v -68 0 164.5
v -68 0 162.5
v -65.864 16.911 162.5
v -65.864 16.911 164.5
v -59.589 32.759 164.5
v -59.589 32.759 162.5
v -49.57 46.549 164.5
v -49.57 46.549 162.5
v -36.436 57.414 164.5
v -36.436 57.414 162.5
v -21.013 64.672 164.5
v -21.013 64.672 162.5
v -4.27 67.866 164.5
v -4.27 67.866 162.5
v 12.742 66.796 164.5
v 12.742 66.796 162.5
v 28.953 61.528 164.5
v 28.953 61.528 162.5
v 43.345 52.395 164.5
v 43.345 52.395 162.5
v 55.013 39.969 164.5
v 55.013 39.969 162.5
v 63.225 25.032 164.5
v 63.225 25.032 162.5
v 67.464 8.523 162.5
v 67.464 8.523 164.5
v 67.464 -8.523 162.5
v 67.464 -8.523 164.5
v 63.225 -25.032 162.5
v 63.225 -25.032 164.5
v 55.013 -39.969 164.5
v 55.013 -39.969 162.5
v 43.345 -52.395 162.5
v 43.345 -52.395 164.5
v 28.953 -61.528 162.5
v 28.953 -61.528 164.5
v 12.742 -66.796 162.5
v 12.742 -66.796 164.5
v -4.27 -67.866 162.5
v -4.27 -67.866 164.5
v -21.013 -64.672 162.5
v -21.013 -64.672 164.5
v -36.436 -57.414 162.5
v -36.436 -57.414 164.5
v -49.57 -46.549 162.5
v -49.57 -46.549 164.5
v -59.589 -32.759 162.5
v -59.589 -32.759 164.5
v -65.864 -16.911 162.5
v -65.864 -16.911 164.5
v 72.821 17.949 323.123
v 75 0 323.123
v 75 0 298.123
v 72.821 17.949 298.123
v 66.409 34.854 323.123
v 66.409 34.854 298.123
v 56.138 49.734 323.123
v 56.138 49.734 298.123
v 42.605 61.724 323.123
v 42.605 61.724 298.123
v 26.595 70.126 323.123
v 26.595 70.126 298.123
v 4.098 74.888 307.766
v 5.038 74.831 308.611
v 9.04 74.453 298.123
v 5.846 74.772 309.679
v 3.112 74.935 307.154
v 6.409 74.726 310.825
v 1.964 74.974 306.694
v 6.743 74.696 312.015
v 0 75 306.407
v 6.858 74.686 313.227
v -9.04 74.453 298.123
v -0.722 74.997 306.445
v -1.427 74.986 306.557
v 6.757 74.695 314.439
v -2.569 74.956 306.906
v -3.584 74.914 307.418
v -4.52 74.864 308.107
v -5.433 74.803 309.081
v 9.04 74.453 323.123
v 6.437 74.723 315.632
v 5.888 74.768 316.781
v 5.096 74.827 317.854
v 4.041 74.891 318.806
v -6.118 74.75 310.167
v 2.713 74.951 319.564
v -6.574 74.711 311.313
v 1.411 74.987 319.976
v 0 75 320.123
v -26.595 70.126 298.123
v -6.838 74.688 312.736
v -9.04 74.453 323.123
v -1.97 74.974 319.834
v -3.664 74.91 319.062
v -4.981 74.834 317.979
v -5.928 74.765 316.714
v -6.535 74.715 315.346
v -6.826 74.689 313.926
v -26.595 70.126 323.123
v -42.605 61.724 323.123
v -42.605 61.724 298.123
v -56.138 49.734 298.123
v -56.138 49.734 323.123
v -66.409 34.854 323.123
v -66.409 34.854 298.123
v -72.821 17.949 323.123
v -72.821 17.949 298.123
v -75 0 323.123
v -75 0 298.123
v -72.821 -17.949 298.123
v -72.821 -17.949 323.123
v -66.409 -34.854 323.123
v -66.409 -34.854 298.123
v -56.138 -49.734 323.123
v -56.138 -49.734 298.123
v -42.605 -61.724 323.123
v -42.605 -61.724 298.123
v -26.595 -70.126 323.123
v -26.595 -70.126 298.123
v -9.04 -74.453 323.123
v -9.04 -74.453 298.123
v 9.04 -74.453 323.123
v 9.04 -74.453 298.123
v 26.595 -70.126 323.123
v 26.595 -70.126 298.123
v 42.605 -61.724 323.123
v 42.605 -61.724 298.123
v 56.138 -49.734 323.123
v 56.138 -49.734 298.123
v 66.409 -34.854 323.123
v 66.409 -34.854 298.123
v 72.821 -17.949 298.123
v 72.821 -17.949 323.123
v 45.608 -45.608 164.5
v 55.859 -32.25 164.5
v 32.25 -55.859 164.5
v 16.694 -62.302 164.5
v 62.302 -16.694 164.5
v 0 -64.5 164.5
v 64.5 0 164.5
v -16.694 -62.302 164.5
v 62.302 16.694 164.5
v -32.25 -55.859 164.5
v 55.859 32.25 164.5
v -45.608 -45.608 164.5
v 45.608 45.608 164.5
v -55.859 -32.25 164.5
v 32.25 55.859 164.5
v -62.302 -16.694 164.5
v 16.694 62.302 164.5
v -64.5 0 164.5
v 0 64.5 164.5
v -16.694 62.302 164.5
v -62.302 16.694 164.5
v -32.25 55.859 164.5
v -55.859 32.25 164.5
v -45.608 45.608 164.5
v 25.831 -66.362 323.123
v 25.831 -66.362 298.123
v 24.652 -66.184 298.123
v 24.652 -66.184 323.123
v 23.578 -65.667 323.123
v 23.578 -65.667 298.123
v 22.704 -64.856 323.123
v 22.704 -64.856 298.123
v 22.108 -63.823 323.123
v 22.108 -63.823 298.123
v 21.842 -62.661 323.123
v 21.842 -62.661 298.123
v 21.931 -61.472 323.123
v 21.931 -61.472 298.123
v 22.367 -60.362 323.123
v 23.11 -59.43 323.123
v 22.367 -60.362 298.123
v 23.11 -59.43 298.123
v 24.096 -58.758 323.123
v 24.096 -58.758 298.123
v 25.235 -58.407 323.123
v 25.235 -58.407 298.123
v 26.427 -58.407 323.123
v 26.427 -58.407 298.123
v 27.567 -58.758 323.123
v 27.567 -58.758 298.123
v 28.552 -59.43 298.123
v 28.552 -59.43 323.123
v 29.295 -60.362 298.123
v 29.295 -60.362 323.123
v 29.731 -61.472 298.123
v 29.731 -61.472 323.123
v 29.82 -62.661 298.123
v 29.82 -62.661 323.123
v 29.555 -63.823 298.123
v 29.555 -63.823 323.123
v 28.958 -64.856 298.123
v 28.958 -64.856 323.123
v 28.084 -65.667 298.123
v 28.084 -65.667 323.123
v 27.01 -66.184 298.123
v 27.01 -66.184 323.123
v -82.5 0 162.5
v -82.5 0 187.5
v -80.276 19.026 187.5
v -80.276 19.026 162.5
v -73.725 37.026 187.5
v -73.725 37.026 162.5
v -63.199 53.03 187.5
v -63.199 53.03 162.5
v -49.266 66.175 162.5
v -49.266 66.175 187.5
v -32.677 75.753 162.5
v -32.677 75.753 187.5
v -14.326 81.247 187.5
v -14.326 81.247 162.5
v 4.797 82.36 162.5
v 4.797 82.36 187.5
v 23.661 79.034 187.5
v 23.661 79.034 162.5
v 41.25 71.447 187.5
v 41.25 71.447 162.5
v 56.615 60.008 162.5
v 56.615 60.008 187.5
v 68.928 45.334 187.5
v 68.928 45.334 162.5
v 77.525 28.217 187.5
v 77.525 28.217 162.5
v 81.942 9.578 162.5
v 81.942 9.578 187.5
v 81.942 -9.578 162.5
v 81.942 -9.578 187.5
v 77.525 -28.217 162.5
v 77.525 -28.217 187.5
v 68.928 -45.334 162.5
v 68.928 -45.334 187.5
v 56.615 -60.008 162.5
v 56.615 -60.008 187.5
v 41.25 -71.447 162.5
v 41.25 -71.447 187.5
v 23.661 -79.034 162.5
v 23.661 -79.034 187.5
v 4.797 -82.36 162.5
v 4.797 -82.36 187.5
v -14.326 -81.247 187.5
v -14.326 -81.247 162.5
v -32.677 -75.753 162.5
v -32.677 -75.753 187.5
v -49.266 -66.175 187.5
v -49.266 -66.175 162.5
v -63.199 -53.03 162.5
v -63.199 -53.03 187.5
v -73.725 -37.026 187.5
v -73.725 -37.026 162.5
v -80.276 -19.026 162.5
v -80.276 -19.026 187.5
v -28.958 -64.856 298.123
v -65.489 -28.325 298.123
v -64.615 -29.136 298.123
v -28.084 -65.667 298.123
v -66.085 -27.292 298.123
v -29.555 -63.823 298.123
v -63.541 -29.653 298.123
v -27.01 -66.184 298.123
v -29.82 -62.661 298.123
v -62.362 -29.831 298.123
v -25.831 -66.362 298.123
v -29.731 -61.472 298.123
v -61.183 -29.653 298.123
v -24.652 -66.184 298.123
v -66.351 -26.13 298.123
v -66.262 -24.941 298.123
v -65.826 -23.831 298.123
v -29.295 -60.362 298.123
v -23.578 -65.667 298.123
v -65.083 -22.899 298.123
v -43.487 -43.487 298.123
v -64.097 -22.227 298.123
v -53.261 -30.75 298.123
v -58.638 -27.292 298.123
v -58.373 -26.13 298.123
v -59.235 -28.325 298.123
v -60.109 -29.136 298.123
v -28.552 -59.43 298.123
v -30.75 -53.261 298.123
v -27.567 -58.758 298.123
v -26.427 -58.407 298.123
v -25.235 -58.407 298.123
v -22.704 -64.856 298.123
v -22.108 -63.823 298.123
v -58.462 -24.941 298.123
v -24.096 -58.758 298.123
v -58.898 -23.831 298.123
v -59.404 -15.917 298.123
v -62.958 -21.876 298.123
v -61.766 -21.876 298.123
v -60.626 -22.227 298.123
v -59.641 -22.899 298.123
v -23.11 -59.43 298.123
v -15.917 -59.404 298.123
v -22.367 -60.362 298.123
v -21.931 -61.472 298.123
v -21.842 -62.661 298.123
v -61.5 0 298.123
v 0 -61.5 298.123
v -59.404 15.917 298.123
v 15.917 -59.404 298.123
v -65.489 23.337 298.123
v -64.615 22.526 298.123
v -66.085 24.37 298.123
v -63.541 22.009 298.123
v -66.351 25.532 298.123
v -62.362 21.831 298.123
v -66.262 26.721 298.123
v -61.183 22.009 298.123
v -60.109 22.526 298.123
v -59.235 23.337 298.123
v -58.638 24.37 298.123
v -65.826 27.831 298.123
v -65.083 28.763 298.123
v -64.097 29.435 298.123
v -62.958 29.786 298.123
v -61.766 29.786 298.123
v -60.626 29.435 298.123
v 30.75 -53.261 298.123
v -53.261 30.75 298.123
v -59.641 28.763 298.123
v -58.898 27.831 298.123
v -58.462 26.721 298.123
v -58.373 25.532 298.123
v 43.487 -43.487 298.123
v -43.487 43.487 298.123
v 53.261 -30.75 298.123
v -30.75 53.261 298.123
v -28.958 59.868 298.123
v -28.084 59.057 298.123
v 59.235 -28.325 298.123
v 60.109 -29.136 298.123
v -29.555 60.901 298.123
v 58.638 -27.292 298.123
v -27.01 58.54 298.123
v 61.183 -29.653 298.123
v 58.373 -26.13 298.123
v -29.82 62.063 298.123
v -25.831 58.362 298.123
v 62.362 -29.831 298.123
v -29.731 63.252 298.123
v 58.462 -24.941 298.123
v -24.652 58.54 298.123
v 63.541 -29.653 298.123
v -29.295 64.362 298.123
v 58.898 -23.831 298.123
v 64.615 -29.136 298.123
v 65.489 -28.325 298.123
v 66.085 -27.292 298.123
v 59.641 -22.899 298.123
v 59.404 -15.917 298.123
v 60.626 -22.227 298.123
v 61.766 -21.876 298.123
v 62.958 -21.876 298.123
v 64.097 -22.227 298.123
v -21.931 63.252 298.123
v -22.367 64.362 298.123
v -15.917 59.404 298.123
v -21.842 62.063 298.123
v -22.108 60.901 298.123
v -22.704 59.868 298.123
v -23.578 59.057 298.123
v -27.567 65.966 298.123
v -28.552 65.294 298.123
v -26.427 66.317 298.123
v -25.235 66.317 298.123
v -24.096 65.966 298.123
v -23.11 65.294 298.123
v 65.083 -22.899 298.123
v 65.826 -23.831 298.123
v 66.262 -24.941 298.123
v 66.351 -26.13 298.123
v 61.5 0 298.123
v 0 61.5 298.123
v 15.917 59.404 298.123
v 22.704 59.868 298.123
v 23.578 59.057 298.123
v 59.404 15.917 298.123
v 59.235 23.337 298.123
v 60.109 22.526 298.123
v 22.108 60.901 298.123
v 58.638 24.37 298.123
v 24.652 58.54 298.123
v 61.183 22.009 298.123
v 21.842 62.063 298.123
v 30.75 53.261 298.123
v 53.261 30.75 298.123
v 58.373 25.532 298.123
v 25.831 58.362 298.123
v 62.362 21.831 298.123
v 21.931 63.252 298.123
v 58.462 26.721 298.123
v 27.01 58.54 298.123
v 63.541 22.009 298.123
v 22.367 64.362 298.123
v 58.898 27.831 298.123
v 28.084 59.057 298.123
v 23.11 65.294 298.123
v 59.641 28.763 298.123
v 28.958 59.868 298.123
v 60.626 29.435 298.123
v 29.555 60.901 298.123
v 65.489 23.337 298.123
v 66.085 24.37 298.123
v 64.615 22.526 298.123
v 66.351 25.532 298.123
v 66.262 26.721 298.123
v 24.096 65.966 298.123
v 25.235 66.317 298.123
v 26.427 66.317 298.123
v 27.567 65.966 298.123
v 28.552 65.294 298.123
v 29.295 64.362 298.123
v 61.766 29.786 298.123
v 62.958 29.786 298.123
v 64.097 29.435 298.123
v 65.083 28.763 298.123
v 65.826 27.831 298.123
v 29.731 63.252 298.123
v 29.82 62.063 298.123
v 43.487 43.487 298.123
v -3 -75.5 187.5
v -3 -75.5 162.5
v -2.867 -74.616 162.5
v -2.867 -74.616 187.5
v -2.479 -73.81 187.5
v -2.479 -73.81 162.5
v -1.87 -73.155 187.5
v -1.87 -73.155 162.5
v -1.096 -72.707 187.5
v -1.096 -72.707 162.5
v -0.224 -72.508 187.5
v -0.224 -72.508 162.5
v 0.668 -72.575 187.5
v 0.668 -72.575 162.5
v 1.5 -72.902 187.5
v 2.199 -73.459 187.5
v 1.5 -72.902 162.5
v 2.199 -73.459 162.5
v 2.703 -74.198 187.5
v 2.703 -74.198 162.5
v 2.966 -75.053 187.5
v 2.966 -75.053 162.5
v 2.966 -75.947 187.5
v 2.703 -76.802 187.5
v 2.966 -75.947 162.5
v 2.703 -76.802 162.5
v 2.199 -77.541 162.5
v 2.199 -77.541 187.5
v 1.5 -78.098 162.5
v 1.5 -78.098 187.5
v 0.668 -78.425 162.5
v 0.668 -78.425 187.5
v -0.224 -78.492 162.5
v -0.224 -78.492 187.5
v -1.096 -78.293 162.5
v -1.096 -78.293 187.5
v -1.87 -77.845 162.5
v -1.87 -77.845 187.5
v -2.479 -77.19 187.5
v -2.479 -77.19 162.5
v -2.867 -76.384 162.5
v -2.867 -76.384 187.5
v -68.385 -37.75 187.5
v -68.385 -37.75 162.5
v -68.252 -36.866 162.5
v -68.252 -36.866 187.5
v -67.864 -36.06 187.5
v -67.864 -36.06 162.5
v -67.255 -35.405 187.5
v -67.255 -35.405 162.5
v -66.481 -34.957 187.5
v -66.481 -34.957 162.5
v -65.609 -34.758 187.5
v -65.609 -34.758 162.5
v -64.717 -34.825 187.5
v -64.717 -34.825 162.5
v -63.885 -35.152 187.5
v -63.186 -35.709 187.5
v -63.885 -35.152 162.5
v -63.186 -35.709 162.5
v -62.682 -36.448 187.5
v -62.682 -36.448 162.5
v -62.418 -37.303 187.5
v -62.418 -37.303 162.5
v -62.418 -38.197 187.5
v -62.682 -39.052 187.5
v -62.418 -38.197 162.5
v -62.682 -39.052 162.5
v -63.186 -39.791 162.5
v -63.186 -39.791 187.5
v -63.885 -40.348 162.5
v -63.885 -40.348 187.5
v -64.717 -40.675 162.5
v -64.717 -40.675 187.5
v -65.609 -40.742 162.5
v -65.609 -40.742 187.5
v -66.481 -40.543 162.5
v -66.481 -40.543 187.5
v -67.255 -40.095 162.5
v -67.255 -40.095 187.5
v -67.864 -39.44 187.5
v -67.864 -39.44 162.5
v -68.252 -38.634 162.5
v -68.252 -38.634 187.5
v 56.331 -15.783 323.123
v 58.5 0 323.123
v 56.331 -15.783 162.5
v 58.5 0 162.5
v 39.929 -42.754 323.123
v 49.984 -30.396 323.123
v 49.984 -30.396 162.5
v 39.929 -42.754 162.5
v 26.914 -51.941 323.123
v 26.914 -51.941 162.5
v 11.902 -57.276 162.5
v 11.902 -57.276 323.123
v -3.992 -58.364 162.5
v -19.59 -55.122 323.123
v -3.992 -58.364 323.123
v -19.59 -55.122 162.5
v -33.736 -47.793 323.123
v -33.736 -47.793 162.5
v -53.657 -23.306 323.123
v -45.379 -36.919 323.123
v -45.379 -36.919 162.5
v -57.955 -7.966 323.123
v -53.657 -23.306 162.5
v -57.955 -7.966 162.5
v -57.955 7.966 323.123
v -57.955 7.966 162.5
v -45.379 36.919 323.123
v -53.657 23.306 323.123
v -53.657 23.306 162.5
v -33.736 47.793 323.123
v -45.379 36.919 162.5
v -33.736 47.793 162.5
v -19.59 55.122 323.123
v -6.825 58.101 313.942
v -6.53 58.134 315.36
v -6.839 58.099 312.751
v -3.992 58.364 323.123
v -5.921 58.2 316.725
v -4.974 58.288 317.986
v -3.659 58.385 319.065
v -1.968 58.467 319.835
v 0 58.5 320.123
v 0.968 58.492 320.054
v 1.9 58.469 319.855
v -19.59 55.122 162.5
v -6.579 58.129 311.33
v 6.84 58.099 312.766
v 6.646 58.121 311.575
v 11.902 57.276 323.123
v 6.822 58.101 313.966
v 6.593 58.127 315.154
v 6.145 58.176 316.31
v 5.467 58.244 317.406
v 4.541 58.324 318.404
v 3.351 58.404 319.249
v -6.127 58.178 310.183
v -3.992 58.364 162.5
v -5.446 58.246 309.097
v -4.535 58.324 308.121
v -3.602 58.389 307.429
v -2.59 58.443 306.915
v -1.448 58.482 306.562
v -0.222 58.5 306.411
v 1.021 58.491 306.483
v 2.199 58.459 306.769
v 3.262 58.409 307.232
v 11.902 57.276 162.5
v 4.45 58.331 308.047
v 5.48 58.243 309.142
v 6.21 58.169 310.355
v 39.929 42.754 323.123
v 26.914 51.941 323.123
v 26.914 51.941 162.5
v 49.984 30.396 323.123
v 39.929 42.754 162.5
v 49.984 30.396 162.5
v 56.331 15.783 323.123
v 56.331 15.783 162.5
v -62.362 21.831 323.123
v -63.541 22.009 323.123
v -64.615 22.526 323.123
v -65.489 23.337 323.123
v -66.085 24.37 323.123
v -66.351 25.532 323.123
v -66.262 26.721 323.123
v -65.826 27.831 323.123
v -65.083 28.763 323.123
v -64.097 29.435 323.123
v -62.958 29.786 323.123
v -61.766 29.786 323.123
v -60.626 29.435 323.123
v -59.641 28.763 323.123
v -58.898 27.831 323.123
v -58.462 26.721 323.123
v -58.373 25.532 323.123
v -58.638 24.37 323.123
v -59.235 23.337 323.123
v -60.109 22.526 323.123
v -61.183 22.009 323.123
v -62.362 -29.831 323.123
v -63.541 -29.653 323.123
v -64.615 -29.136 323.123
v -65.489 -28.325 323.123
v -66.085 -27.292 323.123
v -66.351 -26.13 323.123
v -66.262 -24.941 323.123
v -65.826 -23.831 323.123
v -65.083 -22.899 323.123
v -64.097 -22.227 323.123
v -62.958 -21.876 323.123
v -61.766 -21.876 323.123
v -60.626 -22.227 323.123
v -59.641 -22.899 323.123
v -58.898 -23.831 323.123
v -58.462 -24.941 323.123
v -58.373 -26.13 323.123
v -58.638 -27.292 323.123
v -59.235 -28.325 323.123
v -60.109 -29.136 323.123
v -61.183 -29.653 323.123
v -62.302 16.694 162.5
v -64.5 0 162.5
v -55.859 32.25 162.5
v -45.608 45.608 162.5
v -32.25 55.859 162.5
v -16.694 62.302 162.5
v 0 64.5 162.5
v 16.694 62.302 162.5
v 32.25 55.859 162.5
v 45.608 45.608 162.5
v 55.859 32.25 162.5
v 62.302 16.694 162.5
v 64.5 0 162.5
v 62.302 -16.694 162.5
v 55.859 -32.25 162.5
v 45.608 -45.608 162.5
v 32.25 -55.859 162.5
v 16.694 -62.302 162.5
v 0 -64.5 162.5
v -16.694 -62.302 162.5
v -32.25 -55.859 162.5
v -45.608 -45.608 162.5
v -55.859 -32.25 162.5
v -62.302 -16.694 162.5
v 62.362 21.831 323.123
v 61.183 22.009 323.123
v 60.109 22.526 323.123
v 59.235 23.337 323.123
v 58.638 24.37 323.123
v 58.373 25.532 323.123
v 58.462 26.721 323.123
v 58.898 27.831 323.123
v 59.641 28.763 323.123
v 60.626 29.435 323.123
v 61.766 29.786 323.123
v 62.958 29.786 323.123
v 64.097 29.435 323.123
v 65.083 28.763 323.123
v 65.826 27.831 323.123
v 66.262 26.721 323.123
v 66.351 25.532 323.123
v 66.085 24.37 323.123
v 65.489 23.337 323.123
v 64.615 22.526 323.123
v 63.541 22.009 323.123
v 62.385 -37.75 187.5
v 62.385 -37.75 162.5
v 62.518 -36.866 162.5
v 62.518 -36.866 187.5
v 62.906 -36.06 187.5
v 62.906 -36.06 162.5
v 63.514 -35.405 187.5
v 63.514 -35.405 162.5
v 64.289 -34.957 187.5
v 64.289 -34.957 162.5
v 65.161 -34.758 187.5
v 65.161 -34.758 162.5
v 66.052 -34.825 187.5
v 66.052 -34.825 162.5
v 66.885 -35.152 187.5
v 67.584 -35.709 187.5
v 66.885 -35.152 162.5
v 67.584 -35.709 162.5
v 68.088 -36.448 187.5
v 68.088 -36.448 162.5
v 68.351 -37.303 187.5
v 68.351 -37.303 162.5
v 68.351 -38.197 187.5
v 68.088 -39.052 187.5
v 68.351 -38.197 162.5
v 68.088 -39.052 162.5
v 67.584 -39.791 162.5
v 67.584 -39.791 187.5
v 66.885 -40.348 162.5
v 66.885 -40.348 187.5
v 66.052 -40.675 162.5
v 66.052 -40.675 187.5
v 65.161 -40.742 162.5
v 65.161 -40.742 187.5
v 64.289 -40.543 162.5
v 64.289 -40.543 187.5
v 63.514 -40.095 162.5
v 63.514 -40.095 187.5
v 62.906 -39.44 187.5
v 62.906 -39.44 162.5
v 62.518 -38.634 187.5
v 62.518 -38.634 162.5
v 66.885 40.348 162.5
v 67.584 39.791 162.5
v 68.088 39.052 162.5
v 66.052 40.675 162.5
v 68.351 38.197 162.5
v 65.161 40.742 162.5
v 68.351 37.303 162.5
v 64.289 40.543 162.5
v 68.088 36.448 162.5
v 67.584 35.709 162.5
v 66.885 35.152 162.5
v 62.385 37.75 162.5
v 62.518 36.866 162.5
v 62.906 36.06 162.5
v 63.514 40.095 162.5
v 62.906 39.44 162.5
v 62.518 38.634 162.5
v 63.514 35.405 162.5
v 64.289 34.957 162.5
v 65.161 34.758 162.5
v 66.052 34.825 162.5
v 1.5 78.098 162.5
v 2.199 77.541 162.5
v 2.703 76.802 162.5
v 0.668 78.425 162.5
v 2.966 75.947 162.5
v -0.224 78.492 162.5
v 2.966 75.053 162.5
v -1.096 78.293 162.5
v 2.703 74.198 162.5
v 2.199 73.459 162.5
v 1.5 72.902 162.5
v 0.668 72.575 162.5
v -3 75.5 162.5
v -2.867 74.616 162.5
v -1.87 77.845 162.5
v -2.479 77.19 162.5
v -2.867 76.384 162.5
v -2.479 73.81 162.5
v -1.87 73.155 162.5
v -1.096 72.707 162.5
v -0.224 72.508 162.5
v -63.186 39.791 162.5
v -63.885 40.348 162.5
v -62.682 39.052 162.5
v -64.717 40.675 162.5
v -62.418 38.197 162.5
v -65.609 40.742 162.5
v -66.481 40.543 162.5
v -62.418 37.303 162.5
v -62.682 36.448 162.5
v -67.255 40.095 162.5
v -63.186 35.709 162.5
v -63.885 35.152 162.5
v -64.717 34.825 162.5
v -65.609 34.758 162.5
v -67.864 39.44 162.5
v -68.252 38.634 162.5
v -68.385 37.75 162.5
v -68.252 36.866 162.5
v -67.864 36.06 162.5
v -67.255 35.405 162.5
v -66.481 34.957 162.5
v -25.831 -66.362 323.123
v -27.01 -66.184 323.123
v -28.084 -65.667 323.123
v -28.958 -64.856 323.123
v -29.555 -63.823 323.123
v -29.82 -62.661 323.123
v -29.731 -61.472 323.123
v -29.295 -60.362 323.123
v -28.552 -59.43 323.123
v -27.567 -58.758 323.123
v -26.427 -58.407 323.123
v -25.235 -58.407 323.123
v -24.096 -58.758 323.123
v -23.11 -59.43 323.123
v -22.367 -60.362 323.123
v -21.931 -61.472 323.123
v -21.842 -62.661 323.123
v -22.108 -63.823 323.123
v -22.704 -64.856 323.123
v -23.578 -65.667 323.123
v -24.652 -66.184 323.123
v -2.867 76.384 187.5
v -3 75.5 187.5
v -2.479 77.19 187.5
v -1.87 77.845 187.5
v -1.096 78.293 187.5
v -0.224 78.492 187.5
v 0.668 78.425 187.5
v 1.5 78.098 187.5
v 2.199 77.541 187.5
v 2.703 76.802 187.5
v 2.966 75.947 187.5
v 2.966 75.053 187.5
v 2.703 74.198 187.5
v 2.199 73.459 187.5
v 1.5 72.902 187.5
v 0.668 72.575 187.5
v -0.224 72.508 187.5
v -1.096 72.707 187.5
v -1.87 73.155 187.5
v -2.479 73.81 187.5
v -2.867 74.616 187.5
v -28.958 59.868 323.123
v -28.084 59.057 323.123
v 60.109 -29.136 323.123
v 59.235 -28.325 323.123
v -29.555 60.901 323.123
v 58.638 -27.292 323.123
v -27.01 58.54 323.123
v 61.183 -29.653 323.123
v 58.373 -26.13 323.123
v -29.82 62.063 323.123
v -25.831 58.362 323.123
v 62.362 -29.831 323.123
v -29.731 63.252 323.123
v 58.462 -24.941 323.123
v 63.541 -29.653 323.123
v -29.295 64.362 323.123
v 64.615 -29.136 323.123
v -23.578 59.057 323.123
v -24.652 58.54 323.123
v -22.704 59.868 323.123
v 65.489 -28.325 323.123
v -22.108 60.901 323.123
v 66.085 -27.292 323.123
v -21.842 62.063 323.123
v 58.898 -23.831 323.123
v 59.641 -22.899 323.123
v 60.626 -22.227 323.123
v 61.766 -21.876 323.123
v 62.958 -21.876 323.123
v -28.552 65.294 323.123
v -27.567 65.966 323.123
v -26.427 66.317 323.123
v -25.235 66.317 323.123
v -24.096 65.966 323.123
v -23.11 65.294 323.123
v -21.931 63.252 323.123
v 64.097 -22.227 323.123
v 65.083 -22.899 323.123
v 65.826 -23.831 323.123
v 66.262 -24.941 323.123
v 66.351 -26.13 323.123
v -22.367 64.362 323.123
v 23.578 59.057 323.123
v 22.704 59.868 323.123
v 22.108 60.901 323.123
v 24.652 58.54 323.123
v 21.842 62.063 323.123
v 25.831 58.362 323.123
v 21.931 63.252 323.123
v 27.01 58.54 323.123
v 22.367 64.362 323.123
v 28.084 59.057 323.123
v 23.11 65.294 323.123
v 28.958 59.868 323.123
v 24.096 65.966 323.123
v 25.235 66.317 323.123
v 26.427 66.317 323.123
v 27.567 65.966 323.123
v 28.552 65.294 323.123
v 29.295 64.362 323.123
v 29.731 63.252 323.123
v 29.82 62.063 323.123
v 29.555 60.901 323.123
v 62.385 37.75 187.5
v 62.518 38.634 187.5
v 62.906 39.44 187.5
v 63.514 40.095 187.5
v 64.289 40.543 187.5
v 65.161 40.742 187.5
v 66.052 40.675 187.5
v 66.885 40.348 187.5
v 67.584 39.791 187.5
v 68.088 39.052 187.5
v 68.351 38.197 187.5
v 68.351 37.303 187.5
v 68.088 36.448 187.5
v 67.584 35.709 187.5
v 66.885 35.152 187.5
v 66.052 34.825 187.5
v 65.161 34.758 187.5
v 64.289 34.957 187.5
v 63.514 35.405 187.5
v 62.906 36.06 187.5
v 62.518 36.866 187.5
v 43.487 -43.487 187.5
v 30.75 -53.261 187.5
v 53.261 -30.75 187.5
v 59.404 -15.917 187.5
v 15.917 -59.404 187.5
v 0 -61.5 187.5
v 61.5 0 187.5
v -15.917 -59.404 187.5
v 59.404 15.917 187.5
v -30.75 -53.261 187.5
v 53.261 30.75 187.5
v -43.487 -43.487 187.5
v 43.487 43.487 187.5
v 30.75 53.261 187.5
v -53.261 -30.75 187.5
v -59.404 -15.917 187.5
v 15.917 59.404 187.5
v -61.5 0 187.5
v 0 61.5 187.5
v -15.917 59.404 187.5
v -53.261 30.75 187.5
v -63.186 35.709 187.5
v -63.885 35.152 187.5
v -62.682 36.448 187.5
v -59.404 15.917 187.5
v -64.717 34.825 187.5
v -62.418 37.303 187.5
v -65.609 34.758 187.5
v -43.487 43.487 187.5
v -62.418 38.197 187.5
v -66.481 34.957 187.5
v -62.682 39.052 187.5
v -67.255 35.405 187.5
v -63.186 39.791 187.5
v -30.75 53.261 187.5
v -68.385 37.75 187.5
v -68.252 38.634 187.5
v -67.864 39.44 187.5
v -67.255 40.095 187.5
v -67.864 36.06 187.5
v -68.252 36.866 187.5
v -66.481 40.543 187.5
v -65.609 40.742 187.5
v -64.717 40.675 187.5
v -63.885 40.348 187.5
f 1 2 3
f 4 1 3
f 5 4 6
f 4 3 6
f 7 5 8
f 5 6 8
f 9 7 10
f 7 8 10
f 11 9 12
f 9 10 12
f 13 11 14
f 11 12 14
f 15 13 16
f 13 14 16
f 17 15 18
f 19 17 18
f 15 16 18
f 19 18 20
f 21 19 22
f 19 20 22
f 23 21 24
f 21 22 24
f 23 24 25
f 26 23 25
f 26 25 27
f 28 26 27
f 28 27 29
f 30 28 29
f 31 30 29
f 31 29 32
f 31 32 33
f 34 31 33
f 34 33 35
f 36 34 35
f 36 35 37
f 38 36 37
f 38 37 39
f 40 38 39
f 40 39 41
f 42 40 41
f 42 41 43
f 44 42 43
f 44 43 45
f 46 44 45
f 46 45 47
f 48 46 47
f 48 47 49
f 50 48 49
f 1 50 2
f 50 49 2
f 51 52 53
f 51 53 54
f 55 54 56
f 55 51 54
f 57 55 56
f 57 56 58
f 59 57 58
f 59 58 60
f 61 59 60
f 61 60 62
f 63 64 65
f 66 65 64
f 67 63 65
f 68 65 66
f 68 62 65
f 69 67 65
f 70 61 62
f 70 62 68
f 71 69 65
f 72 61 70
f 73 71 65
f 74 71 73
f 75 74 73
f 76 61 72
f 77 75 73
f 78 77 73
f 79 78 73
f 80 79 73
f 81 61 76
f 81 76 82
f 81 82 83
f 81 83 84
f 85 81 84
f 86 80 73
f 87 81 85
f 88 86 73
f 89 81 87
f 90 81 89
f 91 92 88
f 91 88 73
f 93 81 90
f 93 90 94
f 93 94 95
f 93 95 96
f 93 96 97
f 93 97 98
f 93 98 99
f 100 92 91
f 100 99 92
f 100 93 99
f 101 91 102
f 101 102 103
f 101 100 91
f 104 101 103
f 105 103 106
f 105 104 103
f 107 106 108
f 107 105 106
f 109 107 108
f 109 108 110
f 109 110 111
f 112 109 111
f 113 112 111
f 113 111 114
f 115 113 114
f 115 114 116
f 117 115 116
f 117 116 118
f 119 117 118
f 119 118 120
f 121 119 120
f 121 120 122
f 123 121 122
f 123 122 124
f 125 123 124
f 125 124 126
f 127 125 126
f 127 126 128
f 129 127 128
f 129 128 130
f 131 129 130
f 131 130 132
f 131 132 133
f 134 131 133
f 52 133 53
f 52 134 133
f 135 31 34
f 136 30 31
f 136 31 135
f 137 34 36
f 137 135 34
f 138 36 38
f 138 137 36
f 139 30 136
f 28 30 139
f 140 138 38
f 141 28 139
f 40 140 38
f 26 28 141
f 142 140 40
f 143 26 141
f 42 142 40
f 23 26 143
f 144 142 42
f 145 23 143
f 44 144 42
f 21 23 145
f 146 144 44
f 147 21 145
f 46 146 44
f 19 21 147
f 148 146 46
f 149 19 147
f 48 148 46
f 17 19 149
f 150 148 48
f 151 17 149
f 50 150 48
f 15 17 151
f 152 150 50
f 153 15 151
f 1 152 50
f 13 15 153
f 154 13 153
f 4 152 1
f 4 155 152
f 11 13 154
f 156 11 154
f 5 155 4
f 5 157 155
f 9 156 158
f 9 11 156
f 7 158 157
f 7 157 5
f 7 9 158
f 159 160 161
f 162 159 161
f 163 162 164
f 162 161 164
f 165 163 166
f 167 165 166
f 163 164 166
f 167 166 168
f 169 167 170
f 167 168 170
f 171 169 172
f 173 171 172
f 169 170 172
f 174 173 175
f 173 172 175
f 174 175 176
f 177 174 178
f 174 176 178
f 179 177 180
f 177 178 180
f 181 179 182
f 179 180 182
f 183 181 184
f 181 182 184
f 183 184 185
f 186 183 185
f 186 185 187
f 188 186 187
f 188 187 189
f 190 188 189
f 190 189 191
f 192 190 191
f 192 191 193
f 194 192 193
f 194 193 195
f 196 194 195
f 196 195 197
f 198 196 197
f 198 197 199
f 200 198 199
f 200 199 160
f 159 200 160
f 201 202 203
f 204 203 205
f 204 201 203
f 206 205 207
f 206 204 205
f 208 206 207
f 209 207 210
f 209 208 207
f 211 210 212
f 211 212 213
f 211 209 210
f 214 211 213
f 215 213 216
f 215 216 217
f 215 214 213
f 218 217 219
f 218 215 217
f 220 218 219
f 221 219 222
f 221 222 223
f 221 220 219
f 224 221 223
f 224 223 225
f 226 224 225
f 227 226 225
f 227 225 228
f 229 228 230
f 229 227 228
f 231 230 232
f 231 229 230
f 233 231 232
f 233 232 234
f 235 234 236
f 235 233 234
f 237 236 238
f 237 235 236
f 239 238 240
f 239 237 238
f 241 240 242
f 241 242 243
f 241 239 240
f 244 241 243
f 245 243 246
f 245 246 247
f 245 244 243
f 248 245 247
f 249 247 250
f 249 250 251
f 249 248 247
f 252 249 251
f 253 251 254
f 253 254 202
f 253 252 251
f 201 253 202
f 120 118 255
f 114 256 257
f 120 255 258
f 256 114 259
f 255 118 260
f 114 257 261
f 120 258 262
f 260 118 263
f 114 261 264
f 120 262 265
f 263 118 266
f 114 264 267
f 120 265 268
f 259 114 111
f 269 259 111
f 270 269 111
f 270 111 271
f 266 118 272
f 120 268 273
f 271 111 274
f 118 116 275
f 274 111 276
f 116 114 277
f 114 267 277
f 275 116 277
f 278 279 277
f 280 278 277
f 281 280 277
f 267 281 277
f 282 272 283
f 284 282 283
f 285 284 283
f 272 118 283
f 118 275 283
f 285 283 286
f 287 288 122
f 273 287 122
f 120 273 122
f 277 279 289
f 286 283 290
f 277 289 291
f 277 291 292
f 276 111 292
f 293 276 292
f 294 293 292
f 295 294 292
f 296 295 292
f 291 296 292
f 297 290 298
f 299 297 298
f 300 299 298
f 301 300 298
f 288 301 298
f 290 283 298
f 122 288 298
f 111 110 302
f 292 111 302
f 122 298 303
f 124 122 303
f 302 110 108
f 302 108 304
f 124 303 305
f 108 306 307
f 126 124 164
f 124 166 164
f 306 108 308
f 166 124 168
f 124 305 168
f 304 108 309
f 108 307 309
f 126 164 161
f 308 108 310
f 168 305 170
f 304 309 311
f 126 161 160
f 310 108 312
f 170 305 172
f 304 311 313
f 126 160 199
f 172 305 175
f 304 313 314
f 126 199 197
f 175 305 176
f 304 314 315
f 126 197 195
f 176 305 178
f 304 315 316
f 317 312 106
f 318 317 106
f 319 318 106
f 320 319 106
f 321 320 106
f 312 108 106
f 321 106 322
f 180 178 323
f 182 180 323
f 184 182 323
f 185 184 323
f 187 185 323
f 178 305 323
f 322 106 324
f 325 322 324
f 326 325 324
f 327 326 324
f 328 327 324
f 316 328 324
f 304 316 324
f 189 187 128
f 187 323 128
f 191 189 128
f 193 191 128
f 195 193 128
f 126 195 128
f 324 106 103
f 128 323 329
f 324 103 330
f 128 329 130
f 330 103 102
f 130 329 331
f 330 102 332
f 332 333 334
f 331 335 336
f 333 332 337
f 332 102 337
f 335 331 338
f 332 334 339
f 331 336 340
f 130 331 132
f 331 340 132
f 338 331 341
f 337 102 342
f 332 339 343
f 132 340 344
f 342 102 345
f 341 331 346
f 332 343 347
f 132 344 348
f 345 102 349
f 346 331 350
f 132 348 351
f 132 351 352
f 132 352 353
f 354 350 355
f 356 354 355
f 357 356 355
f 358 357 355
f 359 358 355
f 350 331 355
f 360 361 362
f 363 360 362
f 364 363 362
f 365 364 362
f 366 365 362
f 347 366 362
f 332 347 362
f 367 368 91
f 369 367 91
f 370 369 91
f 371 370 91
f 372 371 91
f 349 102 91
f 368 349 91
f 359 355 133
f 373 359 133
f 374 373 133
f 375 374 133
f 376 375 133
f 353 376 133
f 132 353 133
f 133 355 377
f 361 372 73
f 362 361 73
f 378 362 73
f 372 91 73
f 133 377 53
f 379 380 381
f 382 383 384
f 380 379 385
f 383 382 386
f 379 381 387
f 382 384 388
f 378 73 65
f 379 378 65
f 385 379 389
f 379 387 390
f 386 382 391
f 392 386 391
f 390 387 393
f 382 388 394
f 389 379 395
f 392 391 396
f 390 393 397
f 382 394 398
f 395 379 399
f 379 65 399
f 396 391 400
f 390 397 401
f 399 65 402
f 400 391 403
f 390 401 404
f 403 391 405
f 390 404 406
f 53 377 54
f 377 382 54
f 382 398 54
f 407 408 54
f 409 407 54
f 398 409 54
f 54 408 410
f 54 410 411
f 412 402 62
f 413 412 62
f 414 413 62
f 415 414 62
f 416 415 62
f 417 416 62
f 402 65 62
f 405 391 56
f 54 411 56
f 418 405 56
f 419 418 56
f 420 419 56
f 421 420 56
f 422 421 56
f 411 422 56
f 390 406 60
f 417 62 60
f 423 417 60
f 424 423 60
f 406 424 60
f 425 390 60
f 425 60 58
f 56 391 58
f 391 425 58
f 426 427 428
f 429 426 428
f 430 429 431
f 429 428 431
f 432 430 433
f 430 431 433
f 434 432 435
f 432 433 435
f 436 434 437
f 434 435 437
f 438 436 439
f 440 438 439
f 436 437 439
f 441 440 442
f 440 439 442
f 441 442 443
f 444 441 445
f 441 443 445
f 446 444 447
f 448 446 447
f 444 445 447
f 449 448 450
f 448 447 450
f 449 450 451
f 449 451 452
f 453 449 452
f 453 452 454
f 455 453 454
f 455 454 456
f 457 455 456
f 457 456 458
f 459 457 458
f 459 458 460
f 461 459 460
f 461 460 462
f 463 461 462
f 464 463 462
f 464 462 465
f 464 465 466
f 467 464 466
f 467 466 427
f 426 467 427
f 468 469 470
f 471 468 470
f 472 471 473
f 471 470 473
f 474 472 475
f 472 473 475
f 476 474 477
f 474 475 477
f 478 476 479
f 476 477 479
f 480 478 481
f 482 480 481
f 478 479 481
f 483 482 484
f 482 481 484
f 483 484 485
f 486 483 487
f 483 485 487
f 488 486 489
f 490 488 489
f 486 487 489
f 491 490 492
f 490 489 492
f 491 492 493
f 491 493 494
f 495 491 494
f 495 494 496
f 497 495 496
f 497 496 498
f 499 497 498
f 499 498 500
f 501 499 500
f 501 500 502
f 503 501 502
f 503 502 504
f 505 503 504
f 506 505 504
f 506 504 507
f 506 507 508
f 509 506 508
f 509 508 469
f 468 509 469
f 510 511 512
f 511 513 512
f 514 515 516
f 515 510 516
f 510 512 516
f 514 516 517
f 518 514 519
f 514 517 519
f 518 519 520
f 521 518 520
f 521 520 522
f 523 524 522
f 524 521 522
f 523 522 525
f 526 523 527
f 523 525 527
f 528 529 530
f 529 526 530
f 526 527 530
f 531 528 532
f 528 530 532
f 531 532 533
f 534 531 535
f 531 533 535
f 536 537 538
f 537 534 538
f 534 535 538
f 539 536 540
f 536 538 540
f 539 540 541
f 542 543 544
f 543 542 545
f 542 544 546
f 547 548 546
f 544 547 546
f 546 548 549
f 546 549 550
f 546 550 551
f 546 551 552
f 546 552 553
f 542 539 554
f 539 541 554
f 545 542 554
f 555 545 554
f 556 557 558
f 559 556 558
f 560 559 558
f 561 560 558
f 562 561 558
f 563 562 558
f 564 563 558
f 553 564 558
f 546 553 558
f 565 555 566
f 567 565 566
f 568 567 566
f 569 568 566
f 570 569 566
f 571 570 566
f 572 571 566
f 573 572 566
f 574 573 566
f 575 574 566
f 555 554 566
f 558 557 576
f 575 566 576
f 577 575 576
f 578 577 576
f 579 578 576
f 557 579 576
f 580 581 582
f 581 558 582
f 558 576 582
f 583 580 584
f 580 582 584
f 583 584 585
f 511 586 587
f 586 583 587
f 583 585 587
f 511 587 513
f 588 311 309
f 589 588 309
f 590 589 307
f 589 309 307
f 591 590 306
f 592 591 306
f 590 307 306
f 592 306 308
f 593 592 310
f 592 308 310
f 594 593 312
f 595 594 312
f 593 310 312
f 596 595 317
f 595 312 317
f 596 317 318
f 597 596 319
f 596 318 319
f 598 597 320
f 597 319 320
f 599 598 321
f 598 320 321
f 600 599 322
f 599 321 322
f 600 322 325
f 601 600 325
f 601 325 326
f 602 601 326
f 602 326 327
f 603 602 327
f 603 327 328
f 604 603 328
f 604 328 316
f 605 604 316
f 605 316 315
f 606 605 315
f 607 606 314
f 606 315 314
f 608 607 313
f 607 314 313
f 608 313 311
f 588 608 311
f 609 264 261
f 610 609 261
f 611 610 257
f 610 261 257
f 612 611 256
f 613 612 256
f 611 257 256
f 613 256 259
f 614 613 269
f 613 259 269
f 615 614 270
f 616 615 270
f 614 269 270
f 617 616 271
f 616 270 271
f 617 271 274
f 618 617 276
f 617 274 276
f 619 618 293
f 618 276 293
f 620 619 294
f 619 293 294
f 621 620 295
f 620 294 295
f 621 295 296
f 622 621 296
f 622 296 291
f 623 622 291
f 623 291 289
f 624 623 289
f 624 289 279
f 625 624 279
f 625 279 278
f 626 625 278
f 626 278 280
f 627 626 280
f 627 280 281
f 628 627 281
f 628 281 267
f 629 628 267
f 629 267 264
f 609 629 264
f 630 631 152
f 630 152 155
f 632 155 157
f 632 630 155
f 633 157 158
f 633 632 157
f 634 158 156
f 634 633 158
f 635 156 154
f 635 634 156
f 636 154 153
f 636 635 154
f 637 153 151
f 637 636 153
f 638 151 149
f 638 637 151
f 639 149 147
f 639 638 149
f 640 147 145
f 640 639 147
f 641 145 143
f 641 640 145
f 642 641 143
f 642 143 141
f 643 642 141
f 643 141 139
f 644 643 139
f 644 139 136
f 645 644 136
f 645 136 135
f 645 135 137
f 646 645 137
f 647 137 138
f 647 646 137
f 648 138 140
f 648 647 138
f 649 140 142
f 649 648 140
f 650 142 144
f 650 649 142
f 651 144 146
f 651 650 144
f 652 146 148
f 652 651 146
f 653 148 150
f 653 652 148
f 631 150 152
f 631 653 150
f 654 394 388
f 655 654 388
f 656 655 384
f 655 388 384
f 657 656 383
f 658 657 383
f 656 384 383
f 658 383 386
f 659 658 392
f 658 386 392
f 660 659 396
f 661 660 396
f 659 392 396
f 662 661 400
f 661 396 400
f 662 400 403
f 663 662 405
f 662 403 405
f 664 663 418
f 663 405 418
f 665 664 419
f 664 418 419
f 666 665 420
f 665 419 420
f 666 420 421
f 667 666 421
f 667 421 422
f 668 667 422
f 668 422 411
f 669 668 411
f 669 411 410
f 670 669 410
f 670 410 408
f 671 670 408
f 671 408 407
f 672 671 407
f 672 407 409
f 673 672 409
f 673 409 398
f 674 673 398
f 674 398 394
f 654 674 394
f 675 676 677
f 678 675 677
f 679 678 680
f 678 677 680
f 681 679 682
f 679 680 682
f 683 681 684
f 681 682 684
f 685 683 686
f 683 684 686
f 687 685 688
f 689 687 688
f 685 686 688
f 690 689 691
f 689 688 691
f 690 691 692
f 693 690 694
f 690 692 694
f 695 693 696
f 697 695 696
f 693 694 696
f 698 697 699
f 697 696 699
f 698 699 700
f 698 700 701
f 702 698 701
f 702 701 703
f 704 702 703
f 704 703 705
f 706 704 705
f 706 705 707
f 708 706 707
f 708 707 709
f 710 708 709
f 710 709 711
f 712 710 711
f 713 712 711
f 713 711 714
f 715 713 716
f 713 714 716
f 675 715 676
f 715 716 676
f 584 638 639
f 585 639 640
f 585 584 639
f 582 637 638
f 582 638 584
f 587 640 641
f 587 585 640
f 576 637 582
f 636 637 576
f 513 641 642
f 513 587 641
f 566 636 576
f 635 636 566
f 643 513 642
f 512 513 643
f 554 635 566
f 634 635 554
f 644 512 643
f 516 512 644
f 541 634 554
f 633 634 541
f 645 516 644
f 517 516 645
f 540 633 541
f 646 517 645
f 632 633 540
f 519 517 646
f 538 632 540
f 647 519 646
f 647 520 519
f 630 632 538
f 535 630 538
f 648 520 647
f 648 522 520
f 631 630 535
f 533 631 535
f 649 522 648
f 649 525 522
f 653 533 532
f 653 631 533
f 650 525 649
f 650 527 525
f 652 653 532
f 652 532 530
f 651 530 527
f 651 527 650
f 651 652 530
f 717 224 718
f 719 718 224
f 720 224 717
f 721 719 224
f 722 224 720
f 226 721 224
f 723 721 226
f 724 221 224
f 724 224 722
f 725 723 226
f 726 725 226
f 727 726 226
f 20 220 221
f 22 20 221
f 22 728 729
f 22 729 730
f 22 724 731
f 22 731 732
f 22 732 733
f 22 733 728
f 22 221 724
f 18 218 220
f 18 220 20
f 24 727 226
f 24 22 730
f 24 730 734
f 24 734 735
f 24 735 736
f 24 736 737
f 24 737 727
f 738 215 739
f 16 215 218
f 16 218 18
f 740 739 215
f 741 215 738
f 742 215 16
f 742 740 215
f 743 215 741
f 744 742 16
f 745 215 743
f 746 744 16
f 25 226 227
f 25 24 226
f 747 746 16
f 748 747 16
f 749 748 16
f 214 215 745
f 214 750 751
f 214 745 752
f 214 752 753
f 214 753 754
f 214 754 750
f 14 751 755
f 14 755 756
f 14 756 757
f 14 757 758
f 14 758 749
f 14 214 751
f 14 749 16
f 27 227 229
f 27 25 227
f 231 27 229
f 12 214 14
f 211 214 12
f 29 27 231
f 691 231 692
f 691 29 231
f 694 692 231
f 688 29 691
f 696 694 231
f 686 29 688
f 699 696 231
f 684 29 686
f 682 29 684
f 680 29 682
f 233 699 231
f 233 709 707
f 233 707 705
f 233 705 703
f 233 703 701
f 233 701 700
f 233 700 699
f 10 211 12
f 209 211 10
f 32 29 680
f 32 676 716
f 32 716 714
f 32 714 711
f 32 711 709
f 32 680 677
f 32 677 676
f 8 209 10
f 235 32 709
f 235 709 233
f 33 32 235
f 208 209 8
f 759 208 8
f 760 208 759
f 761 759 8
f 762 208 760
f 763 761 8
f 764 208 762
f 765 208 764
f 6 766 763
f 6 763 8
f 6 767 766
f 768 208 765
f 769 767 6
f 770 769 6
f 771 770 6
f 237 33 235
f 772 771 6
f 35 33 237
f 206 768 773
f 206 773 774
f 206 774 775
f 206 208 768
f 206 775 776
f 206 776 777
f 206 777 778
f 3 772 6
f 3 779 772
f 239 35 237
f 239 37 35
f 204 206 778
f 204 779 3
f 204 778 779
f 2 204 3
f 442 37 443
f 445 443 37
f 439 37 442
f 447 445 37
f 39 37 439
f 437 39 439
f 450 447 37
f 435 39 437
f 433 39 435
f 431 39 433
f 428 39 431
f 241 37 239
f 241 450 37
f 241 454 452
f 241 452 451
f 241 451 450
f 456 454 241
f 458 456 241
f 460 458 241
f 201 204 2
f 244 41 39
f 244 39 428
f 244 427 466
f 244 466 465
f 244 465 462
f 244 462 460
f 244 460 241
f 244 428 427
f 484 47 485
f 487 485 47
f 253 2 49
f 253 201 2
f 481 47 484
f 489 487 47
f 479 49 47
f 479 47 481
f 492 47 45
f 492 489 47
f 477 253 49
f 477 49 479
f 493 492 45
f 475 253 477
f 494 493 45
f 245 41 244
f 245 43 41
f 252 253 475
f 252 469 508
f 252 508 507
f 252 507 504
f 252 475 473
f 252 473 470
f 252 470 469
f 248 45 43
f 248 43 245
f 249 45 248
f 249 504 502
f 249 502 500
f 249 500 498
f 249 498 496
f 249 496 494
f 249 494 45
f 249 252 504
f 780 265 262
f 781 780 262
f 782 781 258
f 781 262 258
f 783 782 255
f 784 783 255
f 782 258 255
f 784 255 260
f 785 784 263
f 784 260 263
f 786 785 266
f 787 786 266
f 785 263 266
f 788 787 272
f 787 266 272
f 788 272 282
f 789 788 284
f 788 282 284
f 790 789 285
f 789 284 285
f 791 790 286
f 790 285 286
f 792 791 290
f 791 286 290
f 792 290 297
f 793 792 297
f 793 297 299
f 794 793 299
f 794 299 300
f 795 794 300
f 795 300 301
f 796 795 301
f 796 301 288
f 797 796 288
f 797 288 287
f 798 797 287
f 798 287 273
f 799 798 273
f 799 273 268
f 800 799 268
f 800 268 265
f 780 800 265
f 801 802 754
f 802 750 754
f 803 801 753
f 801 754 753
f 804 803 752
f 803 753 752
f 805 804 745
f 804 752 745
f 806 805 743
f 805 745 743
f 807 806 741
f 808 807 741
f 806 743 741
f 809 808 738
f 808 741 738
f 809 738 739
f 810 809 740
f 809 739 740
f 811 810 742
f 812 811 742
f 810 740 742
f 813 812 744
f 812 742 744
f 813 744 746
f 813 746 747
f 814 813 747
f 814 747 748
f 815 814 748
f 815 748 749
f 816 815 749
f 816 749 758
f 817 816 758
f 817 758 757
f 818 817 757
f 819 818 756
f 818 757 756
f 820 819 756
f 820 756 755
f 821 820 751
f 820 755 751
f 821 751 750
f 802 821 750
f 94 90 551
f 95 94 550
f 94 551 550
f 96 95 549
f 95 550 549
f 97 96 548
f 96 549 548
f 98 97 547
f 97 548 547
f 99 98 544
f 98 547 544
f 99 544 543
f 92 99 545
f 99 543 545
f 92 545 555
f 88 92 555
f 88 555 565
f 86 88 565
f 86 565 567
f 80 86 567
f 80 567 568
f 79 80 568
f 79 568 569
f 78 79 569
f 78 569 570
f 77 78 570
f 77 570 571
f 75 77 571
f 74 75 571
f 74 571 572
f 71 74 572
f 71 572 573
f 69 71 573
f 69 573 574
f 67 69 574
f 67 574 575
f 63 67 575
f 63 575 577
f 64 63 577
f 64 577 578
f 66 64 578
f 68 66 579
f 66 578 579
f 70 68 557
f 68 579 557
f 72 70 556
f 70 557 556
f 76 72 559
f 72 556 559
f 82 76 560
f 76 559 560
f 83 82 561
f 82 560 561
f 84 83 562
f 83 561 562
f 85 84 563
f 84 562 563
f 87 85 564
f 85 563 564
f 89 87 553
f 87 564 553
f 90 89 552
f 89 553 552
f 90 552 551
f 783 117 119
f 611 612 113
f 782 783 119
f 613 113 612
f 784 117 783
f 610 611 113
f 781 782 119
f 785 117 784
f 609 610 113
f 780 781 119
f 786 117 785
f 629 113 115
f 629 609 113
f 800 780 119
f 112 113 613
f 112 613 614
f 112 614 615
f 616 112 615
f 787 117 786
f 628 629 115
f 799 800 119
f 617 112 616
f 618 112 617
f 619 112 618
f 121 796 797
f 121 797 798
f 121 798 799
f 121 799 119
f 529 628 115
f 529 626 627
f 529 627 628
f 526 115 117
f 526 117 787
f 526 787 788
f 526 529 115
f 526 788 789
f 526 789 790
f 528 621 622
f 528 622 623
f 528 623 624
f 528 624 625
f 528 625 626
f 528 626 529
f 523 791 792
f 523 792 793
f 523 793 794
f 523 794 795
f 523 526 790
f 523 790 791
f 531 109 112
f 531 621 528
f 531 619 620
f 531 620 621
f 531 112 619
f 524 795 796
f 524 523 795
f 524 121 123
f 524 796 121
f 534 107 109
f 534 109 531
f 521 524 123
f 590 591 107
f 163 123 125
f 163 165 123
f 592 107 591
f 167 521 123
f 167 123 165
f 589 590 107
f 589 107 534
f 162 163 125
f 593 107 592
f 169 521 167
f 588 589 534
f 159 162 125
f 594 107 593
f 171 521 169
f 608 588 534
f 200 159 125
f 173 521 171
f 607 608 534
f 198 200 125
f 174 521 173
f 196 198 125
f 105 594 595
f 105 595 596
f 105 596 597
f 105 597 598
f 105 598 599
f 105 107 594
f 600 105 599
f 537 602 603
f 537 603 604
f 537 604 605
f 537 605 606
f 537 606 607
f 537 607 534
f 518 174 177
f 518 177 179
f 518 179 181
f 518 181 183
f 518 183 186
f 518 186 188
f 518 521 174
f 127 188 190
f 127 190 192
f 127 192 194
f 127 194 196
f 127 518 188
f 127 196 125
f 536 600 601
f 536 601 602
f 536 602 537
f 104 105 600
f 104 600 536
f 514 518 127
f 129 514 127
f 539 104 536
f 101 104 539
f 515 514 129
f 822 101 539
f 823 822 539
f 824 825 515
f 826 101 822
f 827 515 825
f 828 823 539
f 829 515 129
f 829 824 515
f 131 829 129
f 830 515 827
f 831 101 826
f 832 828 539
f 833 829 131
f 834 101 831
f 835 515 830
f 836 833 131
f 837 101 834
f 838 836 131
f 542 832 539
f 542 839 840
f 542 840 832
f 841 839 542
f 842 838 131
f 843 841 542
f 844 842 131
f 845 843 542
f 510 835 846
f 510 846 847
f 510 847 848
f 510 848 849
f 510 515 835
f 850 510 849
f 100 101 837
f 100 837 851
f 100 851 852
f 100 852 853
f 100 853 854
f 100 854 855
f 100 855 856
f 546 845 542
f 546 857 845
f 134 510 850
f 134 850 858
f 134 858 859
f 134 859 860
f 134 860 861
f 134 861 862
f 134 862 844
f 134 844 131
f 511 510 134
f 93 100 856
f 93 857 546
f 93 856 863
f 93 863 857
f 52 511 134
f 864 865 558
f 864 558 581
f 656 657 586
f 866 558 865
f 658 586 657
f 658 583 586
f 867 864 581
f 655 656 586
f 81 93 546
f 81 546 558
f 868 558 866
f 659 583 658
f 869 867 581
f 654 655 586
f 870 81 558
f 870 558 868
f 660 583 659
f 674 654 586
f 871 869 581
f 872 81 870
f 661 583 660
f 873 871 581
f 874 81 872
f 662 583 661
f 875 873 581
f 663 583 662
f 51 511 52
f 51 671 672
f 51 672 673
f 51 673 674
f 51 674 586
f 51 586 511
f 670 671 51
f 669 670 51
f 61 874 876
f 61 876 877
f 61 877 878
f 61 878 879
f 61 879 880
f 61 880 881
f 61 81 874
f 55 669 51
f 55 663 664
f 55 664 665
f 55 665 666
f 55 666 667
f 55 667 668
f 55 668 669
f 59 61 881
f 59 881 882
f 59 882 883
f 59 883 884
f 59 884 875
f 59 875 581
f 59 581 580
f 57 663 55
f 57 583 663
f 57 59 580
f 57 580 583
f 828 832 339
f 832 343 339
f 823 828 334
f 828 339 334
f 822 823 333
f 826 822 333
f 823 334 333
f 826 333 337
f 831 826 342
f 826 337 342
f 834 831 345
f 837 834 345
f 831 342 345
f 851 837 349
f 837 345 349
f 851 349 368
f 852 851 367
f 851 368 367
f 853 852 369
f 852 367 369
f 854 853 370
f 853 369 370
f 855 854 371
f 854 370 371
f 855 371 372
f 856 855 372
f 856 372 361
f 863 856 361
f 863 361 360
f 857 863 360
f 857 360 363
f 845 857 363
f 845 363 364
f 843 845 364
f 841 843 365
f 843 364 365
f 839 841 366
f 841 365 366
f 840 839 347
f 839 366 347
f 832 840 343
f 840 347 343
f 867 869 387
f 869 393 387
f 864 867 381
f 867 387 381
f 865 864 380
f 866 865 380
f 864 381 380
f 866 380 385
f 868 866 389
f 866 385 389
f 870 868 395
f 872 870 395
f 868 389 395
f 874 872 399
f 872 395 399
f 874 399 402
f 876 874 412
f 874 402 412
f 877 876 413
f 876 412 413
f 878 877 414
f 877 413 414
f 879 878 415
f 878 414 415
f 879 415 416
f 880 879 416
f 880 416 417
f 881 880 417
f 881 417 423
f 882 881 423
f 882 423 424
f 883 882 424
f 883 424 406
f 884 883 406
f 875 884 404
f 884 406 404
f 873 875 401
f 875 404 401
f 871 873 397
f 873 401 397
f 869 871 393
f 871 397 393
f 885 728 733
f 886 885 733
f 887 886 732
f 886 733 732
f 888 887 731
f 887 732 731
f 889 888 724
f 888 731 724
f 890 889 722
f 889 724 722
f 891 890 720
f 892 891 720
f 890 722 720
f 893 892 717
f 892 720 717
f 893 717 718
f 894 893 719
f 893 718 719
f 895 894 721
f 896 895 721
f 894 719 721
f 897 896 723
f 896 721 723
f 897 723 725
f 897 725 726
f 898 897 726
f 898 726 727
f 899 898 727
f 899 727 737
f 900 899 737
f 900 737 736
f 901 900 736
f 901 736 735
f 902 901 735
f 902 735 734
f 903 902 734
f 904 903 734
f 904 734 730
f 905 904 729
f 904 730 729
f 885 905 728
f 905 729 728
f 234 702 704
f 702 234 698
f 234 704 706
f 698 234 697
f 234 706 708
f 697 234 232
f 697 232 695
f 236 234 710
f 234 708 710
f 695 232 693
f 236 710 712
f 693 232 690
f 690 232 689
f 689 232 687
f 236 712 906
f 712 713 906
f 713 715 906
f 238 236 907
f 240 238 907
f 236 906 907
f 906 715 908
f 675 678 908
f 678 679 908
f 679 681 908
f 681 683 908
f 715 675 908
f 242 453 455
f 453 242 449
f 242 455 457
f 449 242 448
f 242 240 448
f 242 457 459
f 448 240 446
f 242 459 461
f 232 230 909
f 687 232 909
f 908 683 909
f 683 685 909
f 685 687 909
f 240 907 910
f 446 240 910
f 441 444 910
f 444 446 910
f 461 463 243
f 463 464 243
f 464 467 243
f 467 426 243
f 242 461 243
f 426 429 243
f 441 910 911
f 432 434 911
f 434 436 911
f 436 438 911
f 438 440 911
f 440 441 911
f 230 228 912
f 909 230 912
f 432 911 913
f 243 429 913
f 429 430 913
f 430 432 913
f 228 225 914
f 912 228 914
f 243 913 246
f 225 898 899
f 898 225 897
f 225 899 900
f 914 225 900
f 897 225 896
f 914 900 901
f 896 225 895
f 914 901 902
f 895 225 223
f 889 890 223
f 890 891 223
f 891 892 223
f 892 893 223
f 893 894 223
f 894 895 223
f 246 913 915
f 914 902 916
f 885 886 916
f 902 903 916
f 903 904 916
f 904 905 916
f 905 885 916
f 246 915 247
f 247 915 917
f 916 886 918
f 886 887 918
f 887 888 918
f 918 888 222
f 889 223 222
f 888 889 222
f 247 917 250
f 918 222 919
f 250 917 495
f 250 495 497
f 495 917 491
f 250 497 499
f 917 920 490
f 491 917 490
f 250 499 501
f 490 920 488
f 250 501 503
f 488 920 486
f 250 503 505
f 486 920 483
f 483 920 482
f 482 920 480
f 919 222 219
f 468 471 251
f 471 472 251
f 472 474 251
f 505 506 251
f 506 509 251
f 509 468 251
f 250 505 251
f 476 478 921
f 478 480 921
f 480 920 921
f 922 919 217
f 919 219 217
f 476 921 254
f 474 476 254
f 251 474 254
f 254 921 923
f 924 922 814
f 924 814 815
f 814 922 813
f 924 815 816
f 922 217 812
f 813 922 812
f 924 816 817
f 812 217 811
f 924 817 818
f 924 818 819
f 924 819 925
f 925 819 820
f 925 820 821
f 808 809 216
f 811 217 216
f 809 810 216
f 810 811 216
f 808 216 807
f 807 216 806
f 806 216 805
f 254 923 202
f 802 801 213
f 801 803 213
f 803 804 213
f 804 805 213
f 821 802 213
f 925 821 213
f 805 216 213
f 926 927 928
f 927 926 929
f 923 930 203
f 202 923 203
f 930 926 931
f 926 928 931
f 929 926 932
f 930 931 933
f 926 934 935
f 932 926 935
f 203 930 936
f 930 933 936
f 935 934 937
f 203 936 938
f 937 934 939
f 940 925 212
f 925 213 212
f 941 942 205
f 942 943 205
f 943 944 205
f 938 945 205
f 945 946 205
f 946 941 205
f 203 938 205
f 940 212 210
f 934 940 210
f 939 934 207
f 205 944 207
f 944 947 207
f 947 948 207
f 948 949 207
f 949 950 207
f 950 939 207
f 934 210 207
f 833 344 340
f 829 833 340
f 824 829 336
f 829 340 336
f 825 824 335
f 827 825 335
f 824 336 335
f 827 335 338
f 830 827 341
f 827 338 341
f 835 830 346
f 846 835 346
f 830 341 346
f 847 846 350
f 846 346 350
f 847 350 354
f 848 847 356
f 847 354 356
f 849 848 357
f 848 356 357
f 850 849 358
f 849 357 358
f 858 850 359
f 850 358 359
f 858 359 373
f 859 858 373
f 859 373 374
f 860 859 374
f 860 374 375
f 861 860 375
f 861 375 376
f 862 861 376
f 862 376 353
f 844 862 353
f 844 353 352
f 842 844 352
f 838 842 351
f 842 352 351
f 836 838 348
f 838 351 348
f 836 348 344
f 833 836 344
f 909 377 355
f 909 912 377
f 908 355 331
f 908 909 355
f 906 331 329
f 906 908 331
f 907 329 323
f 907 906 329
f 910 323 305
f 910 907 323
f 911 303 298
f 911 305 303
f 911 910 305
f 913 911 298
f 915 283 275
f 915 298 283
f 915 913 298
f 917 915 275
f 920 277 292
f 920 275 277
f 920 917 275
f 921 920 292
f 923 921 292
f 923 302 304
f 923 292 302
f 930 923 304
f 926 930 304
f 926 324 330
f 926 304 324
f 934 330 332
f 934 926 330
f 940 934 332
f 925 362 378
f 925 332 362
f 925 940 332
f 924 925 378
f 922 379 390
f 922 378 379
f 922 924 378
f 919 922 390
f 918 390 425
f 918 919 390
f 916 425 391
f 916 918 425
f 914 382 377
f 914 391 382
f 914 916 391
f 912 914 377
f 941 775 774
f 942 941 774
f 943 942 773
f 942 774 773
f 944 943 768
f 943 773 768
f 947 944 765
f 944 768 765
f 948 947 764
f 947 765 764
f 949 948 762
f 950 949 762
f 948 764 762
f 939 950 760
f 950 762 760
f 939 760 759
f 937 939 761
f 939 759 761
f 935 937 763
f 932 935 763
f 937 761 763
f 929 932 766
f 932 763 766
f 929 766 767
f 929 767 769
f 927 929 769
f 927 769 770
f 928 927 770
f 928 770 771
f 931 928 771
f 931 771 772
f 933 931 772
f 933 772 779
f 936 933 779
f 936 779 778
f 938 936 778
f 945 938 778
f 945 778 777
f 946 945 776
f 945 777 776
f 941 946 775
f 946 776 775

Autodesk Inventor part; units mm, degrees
ref_plane "YZ Plane" through (0, 0, 0) normal (1, 0, 0) x (0, 1, 0)
ref_plane "XY Plane" through (0, 0, 0) normal (0, 0, 1) x (1, 0, 0)
sketch "Sketch1" plane through (0, 0, 0) normal (0, 0, 1) x (1, 0, 0)
  circle A0 centre (0, 0) radius 58.5
  circle A1 centre (0, 0) radius 61.5
  dimension "d0" = 117
  dimension "d1" = 123
extrude "Extrusion1" add sketch "Sketch1" along normal blind 323.123
ref_plane "Work Plane1" through (0, 61.5, 0) normal (0, 1, 0) x (-1, 0, 0)
sketch "Sketch2" plane through (0, 61.5, 0) normal (0, 1, 0) x (-1, 0, 0)
  line L0 (61.5, 0) -> (-61.5, 0) projected
  line L1 (0, 0) -> (0, 4)
  line L2 (0, 4) -> (0, 8.666)
  circle A0 centre (0, 15.524) radius 6.858
  circle A1 centre (0, 15.524) radius 7.858
  dimension "d6" = 4
  dimension "d7" = 4.666
  dimension "d8" = 13.716
  dimension "d9" = 6.858
  dimension "d33" = 15.716
extrude "Extrusion2" cut sketch "Sketch2" against normal blind 23 contours A0
thread "Thread2" size "M14x1.25" class "6H" standard "ANSI Metric M Profile" full length
sketch "Sketch4" plane through (0, 61.5, 0) normal (0, 1, 0) x (-1, 0, 0)
  point P0 (0, 0)
sketch "Sketch5" plane through (0, 61.5, 0) normal (0, 1, 0) x (-1, 0, 0)
  line L0 (0, 0) -> (0, 76) construction
  circle A0 centre (0, 76) radius 4
  dimension "d21" = 76
  dimension "d22" = 8
extrude "Extrusion4" cut sketch "Sketch5" against normal through all
thread "Thread3" size "M8x1.25" class "6H" standard "ANSI Metric M Profile" full length
thread "Thread4" size "M8x1.25" class "6H" standard "ANSI Metric M Profile" full length
sketch "Sketch6" plane through (0, 0, 323.123) normal (0, 0, 1) x (1, 0, 0)
  circle A0 centre (0, 0) radius 75
  circle A1 centre (0, 0) radius 61.5
  dimension "d29" = 150
  dimension "d30" = 123
extrude "Extrusion5" add sketch "Sketch6" against normal blind 25
extrude "Extrusion6" add sketch "Sketch2" along normal blind 10
ref_plane "Work Plane2" through (0, 0, 162.5) normal (0, 0, -1) x (-1, 0, 0)
sketch "Sketch7" plane through (0, 0, 162.5) normal (0, 0, -1) x (-1, 0, 0)
  circle A0 centre (0, 0) radius 82.5
  circle A1 centre (0, 0) radius 58.5 projected
  circle A2 centre (0, 0) radius 65.45
  circle A3 centre (0, 0) radius 75.5
  circle A4 centre (0, 75.5) radius 3
  circle A5 centre (-65.3849, 37.75) radius 3
  circle A6 centre (-65.3849, -37.75) radius 3
  circle A7 centre (0, -75.5) radius 3
  circle A8 centre (65.3849, -37.75) radius 3
  circle A9 centre (65.3849, 37.75) radius 3
  dimension "d77" = 151
  dimension "d40" = 165
  dimension "d78" = 6
  dimension "d81" = 360
split "Split3" plane through (0, 0, 162.5) removes the side toward (0, 0, -1)
sketch "Sketch8" plane through (0, 0, 323.123) normal (0, 0, 1) x (1, 0, 0)
  line L0 (0, 0) -> (0, 98.0779) construction
  line L1 (0, 0) -> (25.8311, 62.3619) construction
  circle A0 centre (25.8311, 62.3619) radius 4
  line L2 (0, 0) -> (62.3619, 25.8311) construction
  circle A1 centre (62.3619, 25.8311) radius 4
  line L3 (0, 0) -> (62.3619, -25.8311) construction
  circle A2 centre (62.3619, -25.8311) radius 4
  line L4 (0, 0) -> (25.8311, -62.3619) construction
  circle A3 centre (25.8311, -62.3619) radius 4
  line L5 (0, 0) -> (-25.8311, -62.3619) construction
  circle A4 centre (-25.8311, -62.3619) radius 4
  line L6 (0, 0) -> (-62.3619, -25.8311) construction
  circle A5 centre (-62.3619, -25.8311) radius 4
  line L7 (0, 0) -> (-62.3619, 25.8311) construction
  circle A6 centre (-62.3619, 25.8311) radius 4
  line L8 (0, 0) -> (-25.8311, 62.3619) construction
  circle A7 centre (-25.8311, 62.3619) radius 4
  dimension "d49" = 22.5
  dimension "d50" = 67.5
  dimension "d51" = 8
  dimension "d54" = 360
hole "Hole1" at (25.8311, 62.3619, 323.123) at (-25.8311, 62.3619, 323.123) at (-62.3619, 25.8311, 323.123) at (-62.3619, -25.8311, 323.123) at (62.3619, 25.8311, 323.123) at (62.3619, -25.8311, 323.123) at (25.8311, -62.3619, 323.123) at (-25.8311, -62.3619, 323.123) direction (0, 0, -1) diameter 8 depth 25
extrude "Extrusion12" add sketch "Sketch7" against normal blind 25 contours A0 | A2 | A3 A8 A7 A6 A5 A4 A9
sketch "Sketch10" plane through (0, 0, 162.5) normal (0, 0, -1) x (-1, 0, 0)
  circle A0 centre (0, 0) radius 64.5
  circle A1 centre (0, 0) radius 68
  dimension "d85" = 129
  dimension "d86" = 136
extrude "Extrusion13" cut sketch "Sketch10" against normal blind 2
ref_plane "Work Plane3" through (0, 75, 0) normal (0, 1, 0) x (-1, 0, 0)
sketch "Sketch11" plane through (0, 75, 0) normal (0, 1, 0) x (-1, 0, 0)
  line L0 (-58.5, 323.123) -> (58.5, 323.123) projected
  line L1 (0, 323.123) -> (0, 320.123)
  line L2 (0, 320.123) -> (0, 313.265)
  circle A0 centre (0, 313.265) radius 6.858
  point P0 (0, 0)
  dimension "d90" = 3
  dimension "d91" = 6.858
  dimension "d92" = 13.716
hole "Hole3" at (0, 75, 313.265) direction (0, -1, 0) diameter 13.716 depth 30 tip angle 118
properties part number "aluminium outer wall - front" material "Aluminum 6061"
